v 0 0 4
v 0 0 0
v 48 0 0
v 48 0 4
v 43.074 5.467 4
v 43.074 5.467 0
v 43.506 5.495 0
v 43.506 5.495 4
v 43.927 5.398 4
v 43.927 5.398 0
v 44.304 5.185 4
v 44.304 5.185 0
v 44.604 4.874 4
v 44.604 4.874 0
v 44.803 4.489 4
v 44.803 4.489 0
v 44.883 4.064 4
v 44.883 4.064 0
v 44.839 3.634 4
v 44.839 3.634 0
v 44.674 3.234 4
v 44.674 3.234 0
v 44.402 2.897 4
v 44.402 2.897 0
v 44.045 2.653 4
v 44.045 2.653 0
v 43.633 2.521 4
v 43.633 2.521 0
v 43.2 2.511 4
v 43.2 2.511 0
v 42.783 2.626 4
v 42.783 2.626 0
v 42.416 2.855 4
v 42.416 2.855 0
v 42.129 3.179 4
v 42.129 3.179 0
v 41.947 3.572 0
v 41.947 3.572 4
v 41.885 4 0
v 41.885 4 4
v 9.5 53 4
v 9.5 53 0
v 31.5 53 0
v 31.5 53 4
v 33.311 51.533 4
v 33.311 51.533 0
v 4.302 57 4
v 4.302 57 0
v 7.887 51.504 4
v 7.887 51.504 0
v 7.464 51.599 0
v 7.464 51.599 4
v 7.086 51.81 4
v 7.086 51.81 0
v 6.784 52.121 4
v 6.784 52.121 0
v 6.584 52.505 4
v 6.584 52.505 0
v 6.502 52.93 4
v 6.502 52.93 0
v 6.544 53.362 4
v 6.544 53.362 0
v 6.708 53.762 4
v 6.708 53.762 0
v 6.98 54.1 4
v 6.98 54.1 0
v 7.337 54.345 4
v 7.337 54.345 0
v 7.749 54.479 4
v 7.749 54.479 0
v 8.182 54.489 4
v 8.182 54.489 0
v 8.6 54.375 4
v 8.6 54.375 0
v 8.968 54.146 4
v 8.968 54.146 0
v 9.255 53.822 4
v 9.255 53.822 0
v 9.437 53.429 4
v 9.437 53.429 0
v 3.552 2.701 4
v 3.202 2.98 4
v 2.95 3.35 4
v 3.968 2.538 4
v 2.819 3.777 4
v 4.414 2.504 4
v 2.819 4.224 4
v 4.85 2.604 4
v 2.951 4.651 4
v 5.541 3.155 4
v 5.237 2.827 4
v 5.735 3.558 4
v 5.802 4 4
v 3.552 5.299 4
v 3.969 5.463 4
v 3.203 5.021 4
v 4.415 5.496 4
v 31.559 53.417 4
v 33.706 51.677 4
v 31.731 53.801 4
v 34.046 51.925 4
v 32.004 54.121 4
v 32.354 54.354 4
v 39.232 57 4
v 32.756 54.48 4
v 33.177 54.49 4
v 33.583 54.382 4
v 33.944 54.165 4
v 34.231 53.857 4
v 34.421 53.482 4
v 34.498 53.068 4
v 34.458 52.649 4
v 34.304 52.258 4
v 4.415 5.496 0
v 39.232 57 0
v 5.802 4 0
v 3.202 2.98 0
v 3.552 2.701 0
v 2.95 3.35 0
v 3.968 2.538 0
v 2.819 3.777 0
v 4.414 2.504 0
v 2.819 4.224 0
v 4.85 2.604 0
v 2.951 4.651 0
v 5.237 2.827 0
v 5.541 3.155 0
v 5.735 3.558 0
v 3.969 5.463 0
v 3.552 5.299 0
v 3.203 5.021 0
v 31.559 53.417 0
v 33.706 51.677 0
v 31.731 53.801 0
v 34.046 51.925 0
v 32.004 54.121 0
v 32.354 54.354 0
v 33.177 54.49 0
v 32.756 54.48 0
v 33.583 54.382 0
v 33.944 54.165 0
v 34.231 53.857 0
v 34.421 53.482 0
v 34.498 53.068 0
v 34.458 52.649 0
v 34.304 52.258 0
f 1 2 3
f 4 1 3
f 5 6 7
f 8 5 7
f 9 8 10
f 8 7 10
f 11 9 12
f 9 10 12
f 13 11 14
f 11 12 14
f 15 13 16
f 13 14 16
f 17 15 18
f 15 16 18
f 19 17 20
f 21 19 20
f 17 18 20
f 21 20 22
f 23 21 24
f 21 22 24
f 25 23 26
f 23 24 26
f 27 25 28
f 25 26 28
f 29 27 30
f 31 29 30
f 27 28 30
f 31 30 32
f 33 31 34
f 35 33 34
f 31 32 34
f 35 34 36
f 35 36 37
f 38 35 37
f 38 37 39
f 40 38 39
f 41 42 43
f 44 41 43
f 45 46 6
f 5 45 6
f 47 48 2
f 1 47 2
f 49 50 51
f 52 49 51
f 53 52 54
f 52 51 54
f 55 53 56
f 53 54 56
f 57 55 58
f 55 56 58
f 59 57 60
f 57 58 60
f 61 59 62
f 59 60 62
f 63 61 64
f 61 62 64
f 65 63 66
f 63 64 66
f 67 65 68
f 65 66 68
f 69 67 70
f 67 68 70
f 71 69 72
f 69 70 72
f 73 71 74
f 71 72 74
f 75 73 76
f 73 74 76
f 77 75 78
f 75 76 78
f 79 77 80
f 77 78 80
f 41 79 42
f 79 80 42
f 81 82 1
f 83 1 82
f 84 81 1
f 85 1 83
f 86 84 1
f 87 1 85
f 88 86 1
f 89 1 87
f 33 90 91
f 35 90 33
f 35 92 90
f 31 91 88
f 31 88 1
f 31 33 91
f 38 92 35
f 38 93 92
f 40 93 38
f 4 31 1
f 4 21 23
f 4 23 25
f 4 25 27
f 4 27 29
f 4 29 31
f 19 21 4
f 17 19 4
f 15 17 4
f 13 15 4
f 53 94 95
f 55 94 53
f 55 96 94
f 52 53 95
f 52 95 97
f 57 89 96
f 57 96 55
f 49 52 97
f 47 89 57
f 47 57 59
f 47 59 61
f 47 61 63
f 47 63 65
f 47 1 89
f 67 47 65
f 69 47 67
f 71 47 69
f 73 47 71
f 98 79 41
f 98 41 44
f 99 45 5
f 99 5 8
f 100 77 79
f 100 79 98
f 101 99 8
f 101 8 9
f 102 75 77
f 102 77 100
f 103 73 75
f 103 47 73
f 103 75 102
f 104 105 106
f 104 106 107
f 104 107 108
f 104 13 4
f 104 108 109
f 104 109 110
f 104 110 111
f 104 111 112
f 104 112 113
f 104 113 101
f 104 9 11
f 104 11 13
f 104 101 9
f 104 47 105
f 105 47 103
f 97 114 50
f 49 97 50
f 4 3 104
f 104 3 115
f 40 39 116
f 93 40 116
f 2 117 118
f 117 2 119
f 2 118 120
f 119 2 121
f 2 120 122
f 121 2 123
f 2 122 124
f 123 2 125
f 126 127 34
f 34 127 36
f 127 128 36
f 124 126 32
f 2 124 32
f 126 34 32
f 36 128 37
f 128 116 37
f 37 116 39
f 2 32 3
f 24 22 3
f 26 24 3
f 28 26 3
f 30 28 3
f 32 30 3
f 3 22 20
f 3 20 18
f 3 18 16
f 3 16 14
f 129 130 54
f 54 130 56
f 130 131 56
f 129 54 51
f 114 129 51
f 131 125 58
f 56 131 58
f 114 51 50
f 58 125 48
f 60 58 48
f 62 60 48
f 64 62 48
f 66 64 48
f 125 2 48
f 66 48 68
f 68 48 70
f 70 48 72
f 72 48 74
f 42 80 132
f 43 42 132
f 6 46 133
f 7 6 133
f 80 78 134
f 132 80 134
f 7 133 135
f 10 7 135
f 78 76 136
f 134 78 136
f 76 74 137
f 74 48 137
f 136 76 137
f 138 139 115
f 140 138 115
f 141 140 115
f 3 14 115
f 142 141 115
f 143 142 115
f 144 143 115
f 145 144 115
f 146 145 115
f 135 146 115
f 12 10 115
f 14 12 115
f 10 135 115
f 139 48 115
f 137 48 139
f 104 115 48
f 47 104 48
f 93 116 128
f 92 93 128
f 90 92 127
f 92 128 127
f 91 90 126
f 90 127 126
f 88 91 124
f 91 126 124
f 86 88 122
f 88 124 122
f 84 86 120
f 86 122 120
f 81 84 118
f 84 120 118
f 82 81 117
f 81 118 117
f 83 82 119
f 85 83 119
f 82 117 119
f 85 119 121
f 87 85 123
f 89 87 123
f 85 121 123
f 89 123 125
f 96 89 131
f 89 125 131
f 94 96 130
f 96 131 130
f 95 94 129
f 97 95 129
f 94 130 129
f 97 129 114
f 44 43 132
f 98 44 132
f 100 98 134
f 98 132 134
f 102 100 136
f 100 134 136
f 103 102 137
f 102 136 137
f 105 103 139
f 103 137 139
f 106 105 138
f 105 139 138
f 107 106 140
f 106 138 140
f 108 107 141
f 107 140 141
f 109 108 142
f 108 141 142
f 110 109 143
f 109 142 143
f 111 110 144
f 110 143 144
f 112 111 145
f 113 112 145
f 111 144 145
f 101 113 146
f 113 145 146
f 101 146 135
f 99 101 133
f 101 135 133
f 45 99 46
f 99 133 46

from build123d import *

# Parameters (mm, degrees)
EXTRUDE_1_DEPTH = 4


with BuildPart() as part:
    # Эскиз1 → Бобышка-Вытянуть1 (new body)
    with BuildSketch(Plane.XY):
        Polygon((0, 0), (48, 0), (39.231886792, 57), (4.301886792, 57), align=None)
        with BuildLine():
            Line((4.414773297, 5.495746181), (7.887113496, 51.504253819))
            ThreePointArc((7.887113496, 51.504253819), (6.980031804, 54.099847661), (9.5, 53))
            Line((9.5, 53), (31.5, 53))
            ThreePointArc((31.5, 53), (33.94432859, 54.165437048), (33.310991351, 51.532592633))
            Line((33.310991351, 51.532592633), (43.073702459, 5.467407367))
            ThreePointArc((43.073702459, 5.467407367), (44.550130858, 3.05567141), (41.88469381, 4))
            Line((41.88469381, 4), (5.801886792, 4))
            ThreePointArc((5.801886792, 4), (3.202039131, 2.980031804), (4.414773297, 5.495746181))
        make_face(mode=Mode.SUBTRACT)
    extrude(amount=EXTRUDE_1_DEPTH)


solid = part.part
